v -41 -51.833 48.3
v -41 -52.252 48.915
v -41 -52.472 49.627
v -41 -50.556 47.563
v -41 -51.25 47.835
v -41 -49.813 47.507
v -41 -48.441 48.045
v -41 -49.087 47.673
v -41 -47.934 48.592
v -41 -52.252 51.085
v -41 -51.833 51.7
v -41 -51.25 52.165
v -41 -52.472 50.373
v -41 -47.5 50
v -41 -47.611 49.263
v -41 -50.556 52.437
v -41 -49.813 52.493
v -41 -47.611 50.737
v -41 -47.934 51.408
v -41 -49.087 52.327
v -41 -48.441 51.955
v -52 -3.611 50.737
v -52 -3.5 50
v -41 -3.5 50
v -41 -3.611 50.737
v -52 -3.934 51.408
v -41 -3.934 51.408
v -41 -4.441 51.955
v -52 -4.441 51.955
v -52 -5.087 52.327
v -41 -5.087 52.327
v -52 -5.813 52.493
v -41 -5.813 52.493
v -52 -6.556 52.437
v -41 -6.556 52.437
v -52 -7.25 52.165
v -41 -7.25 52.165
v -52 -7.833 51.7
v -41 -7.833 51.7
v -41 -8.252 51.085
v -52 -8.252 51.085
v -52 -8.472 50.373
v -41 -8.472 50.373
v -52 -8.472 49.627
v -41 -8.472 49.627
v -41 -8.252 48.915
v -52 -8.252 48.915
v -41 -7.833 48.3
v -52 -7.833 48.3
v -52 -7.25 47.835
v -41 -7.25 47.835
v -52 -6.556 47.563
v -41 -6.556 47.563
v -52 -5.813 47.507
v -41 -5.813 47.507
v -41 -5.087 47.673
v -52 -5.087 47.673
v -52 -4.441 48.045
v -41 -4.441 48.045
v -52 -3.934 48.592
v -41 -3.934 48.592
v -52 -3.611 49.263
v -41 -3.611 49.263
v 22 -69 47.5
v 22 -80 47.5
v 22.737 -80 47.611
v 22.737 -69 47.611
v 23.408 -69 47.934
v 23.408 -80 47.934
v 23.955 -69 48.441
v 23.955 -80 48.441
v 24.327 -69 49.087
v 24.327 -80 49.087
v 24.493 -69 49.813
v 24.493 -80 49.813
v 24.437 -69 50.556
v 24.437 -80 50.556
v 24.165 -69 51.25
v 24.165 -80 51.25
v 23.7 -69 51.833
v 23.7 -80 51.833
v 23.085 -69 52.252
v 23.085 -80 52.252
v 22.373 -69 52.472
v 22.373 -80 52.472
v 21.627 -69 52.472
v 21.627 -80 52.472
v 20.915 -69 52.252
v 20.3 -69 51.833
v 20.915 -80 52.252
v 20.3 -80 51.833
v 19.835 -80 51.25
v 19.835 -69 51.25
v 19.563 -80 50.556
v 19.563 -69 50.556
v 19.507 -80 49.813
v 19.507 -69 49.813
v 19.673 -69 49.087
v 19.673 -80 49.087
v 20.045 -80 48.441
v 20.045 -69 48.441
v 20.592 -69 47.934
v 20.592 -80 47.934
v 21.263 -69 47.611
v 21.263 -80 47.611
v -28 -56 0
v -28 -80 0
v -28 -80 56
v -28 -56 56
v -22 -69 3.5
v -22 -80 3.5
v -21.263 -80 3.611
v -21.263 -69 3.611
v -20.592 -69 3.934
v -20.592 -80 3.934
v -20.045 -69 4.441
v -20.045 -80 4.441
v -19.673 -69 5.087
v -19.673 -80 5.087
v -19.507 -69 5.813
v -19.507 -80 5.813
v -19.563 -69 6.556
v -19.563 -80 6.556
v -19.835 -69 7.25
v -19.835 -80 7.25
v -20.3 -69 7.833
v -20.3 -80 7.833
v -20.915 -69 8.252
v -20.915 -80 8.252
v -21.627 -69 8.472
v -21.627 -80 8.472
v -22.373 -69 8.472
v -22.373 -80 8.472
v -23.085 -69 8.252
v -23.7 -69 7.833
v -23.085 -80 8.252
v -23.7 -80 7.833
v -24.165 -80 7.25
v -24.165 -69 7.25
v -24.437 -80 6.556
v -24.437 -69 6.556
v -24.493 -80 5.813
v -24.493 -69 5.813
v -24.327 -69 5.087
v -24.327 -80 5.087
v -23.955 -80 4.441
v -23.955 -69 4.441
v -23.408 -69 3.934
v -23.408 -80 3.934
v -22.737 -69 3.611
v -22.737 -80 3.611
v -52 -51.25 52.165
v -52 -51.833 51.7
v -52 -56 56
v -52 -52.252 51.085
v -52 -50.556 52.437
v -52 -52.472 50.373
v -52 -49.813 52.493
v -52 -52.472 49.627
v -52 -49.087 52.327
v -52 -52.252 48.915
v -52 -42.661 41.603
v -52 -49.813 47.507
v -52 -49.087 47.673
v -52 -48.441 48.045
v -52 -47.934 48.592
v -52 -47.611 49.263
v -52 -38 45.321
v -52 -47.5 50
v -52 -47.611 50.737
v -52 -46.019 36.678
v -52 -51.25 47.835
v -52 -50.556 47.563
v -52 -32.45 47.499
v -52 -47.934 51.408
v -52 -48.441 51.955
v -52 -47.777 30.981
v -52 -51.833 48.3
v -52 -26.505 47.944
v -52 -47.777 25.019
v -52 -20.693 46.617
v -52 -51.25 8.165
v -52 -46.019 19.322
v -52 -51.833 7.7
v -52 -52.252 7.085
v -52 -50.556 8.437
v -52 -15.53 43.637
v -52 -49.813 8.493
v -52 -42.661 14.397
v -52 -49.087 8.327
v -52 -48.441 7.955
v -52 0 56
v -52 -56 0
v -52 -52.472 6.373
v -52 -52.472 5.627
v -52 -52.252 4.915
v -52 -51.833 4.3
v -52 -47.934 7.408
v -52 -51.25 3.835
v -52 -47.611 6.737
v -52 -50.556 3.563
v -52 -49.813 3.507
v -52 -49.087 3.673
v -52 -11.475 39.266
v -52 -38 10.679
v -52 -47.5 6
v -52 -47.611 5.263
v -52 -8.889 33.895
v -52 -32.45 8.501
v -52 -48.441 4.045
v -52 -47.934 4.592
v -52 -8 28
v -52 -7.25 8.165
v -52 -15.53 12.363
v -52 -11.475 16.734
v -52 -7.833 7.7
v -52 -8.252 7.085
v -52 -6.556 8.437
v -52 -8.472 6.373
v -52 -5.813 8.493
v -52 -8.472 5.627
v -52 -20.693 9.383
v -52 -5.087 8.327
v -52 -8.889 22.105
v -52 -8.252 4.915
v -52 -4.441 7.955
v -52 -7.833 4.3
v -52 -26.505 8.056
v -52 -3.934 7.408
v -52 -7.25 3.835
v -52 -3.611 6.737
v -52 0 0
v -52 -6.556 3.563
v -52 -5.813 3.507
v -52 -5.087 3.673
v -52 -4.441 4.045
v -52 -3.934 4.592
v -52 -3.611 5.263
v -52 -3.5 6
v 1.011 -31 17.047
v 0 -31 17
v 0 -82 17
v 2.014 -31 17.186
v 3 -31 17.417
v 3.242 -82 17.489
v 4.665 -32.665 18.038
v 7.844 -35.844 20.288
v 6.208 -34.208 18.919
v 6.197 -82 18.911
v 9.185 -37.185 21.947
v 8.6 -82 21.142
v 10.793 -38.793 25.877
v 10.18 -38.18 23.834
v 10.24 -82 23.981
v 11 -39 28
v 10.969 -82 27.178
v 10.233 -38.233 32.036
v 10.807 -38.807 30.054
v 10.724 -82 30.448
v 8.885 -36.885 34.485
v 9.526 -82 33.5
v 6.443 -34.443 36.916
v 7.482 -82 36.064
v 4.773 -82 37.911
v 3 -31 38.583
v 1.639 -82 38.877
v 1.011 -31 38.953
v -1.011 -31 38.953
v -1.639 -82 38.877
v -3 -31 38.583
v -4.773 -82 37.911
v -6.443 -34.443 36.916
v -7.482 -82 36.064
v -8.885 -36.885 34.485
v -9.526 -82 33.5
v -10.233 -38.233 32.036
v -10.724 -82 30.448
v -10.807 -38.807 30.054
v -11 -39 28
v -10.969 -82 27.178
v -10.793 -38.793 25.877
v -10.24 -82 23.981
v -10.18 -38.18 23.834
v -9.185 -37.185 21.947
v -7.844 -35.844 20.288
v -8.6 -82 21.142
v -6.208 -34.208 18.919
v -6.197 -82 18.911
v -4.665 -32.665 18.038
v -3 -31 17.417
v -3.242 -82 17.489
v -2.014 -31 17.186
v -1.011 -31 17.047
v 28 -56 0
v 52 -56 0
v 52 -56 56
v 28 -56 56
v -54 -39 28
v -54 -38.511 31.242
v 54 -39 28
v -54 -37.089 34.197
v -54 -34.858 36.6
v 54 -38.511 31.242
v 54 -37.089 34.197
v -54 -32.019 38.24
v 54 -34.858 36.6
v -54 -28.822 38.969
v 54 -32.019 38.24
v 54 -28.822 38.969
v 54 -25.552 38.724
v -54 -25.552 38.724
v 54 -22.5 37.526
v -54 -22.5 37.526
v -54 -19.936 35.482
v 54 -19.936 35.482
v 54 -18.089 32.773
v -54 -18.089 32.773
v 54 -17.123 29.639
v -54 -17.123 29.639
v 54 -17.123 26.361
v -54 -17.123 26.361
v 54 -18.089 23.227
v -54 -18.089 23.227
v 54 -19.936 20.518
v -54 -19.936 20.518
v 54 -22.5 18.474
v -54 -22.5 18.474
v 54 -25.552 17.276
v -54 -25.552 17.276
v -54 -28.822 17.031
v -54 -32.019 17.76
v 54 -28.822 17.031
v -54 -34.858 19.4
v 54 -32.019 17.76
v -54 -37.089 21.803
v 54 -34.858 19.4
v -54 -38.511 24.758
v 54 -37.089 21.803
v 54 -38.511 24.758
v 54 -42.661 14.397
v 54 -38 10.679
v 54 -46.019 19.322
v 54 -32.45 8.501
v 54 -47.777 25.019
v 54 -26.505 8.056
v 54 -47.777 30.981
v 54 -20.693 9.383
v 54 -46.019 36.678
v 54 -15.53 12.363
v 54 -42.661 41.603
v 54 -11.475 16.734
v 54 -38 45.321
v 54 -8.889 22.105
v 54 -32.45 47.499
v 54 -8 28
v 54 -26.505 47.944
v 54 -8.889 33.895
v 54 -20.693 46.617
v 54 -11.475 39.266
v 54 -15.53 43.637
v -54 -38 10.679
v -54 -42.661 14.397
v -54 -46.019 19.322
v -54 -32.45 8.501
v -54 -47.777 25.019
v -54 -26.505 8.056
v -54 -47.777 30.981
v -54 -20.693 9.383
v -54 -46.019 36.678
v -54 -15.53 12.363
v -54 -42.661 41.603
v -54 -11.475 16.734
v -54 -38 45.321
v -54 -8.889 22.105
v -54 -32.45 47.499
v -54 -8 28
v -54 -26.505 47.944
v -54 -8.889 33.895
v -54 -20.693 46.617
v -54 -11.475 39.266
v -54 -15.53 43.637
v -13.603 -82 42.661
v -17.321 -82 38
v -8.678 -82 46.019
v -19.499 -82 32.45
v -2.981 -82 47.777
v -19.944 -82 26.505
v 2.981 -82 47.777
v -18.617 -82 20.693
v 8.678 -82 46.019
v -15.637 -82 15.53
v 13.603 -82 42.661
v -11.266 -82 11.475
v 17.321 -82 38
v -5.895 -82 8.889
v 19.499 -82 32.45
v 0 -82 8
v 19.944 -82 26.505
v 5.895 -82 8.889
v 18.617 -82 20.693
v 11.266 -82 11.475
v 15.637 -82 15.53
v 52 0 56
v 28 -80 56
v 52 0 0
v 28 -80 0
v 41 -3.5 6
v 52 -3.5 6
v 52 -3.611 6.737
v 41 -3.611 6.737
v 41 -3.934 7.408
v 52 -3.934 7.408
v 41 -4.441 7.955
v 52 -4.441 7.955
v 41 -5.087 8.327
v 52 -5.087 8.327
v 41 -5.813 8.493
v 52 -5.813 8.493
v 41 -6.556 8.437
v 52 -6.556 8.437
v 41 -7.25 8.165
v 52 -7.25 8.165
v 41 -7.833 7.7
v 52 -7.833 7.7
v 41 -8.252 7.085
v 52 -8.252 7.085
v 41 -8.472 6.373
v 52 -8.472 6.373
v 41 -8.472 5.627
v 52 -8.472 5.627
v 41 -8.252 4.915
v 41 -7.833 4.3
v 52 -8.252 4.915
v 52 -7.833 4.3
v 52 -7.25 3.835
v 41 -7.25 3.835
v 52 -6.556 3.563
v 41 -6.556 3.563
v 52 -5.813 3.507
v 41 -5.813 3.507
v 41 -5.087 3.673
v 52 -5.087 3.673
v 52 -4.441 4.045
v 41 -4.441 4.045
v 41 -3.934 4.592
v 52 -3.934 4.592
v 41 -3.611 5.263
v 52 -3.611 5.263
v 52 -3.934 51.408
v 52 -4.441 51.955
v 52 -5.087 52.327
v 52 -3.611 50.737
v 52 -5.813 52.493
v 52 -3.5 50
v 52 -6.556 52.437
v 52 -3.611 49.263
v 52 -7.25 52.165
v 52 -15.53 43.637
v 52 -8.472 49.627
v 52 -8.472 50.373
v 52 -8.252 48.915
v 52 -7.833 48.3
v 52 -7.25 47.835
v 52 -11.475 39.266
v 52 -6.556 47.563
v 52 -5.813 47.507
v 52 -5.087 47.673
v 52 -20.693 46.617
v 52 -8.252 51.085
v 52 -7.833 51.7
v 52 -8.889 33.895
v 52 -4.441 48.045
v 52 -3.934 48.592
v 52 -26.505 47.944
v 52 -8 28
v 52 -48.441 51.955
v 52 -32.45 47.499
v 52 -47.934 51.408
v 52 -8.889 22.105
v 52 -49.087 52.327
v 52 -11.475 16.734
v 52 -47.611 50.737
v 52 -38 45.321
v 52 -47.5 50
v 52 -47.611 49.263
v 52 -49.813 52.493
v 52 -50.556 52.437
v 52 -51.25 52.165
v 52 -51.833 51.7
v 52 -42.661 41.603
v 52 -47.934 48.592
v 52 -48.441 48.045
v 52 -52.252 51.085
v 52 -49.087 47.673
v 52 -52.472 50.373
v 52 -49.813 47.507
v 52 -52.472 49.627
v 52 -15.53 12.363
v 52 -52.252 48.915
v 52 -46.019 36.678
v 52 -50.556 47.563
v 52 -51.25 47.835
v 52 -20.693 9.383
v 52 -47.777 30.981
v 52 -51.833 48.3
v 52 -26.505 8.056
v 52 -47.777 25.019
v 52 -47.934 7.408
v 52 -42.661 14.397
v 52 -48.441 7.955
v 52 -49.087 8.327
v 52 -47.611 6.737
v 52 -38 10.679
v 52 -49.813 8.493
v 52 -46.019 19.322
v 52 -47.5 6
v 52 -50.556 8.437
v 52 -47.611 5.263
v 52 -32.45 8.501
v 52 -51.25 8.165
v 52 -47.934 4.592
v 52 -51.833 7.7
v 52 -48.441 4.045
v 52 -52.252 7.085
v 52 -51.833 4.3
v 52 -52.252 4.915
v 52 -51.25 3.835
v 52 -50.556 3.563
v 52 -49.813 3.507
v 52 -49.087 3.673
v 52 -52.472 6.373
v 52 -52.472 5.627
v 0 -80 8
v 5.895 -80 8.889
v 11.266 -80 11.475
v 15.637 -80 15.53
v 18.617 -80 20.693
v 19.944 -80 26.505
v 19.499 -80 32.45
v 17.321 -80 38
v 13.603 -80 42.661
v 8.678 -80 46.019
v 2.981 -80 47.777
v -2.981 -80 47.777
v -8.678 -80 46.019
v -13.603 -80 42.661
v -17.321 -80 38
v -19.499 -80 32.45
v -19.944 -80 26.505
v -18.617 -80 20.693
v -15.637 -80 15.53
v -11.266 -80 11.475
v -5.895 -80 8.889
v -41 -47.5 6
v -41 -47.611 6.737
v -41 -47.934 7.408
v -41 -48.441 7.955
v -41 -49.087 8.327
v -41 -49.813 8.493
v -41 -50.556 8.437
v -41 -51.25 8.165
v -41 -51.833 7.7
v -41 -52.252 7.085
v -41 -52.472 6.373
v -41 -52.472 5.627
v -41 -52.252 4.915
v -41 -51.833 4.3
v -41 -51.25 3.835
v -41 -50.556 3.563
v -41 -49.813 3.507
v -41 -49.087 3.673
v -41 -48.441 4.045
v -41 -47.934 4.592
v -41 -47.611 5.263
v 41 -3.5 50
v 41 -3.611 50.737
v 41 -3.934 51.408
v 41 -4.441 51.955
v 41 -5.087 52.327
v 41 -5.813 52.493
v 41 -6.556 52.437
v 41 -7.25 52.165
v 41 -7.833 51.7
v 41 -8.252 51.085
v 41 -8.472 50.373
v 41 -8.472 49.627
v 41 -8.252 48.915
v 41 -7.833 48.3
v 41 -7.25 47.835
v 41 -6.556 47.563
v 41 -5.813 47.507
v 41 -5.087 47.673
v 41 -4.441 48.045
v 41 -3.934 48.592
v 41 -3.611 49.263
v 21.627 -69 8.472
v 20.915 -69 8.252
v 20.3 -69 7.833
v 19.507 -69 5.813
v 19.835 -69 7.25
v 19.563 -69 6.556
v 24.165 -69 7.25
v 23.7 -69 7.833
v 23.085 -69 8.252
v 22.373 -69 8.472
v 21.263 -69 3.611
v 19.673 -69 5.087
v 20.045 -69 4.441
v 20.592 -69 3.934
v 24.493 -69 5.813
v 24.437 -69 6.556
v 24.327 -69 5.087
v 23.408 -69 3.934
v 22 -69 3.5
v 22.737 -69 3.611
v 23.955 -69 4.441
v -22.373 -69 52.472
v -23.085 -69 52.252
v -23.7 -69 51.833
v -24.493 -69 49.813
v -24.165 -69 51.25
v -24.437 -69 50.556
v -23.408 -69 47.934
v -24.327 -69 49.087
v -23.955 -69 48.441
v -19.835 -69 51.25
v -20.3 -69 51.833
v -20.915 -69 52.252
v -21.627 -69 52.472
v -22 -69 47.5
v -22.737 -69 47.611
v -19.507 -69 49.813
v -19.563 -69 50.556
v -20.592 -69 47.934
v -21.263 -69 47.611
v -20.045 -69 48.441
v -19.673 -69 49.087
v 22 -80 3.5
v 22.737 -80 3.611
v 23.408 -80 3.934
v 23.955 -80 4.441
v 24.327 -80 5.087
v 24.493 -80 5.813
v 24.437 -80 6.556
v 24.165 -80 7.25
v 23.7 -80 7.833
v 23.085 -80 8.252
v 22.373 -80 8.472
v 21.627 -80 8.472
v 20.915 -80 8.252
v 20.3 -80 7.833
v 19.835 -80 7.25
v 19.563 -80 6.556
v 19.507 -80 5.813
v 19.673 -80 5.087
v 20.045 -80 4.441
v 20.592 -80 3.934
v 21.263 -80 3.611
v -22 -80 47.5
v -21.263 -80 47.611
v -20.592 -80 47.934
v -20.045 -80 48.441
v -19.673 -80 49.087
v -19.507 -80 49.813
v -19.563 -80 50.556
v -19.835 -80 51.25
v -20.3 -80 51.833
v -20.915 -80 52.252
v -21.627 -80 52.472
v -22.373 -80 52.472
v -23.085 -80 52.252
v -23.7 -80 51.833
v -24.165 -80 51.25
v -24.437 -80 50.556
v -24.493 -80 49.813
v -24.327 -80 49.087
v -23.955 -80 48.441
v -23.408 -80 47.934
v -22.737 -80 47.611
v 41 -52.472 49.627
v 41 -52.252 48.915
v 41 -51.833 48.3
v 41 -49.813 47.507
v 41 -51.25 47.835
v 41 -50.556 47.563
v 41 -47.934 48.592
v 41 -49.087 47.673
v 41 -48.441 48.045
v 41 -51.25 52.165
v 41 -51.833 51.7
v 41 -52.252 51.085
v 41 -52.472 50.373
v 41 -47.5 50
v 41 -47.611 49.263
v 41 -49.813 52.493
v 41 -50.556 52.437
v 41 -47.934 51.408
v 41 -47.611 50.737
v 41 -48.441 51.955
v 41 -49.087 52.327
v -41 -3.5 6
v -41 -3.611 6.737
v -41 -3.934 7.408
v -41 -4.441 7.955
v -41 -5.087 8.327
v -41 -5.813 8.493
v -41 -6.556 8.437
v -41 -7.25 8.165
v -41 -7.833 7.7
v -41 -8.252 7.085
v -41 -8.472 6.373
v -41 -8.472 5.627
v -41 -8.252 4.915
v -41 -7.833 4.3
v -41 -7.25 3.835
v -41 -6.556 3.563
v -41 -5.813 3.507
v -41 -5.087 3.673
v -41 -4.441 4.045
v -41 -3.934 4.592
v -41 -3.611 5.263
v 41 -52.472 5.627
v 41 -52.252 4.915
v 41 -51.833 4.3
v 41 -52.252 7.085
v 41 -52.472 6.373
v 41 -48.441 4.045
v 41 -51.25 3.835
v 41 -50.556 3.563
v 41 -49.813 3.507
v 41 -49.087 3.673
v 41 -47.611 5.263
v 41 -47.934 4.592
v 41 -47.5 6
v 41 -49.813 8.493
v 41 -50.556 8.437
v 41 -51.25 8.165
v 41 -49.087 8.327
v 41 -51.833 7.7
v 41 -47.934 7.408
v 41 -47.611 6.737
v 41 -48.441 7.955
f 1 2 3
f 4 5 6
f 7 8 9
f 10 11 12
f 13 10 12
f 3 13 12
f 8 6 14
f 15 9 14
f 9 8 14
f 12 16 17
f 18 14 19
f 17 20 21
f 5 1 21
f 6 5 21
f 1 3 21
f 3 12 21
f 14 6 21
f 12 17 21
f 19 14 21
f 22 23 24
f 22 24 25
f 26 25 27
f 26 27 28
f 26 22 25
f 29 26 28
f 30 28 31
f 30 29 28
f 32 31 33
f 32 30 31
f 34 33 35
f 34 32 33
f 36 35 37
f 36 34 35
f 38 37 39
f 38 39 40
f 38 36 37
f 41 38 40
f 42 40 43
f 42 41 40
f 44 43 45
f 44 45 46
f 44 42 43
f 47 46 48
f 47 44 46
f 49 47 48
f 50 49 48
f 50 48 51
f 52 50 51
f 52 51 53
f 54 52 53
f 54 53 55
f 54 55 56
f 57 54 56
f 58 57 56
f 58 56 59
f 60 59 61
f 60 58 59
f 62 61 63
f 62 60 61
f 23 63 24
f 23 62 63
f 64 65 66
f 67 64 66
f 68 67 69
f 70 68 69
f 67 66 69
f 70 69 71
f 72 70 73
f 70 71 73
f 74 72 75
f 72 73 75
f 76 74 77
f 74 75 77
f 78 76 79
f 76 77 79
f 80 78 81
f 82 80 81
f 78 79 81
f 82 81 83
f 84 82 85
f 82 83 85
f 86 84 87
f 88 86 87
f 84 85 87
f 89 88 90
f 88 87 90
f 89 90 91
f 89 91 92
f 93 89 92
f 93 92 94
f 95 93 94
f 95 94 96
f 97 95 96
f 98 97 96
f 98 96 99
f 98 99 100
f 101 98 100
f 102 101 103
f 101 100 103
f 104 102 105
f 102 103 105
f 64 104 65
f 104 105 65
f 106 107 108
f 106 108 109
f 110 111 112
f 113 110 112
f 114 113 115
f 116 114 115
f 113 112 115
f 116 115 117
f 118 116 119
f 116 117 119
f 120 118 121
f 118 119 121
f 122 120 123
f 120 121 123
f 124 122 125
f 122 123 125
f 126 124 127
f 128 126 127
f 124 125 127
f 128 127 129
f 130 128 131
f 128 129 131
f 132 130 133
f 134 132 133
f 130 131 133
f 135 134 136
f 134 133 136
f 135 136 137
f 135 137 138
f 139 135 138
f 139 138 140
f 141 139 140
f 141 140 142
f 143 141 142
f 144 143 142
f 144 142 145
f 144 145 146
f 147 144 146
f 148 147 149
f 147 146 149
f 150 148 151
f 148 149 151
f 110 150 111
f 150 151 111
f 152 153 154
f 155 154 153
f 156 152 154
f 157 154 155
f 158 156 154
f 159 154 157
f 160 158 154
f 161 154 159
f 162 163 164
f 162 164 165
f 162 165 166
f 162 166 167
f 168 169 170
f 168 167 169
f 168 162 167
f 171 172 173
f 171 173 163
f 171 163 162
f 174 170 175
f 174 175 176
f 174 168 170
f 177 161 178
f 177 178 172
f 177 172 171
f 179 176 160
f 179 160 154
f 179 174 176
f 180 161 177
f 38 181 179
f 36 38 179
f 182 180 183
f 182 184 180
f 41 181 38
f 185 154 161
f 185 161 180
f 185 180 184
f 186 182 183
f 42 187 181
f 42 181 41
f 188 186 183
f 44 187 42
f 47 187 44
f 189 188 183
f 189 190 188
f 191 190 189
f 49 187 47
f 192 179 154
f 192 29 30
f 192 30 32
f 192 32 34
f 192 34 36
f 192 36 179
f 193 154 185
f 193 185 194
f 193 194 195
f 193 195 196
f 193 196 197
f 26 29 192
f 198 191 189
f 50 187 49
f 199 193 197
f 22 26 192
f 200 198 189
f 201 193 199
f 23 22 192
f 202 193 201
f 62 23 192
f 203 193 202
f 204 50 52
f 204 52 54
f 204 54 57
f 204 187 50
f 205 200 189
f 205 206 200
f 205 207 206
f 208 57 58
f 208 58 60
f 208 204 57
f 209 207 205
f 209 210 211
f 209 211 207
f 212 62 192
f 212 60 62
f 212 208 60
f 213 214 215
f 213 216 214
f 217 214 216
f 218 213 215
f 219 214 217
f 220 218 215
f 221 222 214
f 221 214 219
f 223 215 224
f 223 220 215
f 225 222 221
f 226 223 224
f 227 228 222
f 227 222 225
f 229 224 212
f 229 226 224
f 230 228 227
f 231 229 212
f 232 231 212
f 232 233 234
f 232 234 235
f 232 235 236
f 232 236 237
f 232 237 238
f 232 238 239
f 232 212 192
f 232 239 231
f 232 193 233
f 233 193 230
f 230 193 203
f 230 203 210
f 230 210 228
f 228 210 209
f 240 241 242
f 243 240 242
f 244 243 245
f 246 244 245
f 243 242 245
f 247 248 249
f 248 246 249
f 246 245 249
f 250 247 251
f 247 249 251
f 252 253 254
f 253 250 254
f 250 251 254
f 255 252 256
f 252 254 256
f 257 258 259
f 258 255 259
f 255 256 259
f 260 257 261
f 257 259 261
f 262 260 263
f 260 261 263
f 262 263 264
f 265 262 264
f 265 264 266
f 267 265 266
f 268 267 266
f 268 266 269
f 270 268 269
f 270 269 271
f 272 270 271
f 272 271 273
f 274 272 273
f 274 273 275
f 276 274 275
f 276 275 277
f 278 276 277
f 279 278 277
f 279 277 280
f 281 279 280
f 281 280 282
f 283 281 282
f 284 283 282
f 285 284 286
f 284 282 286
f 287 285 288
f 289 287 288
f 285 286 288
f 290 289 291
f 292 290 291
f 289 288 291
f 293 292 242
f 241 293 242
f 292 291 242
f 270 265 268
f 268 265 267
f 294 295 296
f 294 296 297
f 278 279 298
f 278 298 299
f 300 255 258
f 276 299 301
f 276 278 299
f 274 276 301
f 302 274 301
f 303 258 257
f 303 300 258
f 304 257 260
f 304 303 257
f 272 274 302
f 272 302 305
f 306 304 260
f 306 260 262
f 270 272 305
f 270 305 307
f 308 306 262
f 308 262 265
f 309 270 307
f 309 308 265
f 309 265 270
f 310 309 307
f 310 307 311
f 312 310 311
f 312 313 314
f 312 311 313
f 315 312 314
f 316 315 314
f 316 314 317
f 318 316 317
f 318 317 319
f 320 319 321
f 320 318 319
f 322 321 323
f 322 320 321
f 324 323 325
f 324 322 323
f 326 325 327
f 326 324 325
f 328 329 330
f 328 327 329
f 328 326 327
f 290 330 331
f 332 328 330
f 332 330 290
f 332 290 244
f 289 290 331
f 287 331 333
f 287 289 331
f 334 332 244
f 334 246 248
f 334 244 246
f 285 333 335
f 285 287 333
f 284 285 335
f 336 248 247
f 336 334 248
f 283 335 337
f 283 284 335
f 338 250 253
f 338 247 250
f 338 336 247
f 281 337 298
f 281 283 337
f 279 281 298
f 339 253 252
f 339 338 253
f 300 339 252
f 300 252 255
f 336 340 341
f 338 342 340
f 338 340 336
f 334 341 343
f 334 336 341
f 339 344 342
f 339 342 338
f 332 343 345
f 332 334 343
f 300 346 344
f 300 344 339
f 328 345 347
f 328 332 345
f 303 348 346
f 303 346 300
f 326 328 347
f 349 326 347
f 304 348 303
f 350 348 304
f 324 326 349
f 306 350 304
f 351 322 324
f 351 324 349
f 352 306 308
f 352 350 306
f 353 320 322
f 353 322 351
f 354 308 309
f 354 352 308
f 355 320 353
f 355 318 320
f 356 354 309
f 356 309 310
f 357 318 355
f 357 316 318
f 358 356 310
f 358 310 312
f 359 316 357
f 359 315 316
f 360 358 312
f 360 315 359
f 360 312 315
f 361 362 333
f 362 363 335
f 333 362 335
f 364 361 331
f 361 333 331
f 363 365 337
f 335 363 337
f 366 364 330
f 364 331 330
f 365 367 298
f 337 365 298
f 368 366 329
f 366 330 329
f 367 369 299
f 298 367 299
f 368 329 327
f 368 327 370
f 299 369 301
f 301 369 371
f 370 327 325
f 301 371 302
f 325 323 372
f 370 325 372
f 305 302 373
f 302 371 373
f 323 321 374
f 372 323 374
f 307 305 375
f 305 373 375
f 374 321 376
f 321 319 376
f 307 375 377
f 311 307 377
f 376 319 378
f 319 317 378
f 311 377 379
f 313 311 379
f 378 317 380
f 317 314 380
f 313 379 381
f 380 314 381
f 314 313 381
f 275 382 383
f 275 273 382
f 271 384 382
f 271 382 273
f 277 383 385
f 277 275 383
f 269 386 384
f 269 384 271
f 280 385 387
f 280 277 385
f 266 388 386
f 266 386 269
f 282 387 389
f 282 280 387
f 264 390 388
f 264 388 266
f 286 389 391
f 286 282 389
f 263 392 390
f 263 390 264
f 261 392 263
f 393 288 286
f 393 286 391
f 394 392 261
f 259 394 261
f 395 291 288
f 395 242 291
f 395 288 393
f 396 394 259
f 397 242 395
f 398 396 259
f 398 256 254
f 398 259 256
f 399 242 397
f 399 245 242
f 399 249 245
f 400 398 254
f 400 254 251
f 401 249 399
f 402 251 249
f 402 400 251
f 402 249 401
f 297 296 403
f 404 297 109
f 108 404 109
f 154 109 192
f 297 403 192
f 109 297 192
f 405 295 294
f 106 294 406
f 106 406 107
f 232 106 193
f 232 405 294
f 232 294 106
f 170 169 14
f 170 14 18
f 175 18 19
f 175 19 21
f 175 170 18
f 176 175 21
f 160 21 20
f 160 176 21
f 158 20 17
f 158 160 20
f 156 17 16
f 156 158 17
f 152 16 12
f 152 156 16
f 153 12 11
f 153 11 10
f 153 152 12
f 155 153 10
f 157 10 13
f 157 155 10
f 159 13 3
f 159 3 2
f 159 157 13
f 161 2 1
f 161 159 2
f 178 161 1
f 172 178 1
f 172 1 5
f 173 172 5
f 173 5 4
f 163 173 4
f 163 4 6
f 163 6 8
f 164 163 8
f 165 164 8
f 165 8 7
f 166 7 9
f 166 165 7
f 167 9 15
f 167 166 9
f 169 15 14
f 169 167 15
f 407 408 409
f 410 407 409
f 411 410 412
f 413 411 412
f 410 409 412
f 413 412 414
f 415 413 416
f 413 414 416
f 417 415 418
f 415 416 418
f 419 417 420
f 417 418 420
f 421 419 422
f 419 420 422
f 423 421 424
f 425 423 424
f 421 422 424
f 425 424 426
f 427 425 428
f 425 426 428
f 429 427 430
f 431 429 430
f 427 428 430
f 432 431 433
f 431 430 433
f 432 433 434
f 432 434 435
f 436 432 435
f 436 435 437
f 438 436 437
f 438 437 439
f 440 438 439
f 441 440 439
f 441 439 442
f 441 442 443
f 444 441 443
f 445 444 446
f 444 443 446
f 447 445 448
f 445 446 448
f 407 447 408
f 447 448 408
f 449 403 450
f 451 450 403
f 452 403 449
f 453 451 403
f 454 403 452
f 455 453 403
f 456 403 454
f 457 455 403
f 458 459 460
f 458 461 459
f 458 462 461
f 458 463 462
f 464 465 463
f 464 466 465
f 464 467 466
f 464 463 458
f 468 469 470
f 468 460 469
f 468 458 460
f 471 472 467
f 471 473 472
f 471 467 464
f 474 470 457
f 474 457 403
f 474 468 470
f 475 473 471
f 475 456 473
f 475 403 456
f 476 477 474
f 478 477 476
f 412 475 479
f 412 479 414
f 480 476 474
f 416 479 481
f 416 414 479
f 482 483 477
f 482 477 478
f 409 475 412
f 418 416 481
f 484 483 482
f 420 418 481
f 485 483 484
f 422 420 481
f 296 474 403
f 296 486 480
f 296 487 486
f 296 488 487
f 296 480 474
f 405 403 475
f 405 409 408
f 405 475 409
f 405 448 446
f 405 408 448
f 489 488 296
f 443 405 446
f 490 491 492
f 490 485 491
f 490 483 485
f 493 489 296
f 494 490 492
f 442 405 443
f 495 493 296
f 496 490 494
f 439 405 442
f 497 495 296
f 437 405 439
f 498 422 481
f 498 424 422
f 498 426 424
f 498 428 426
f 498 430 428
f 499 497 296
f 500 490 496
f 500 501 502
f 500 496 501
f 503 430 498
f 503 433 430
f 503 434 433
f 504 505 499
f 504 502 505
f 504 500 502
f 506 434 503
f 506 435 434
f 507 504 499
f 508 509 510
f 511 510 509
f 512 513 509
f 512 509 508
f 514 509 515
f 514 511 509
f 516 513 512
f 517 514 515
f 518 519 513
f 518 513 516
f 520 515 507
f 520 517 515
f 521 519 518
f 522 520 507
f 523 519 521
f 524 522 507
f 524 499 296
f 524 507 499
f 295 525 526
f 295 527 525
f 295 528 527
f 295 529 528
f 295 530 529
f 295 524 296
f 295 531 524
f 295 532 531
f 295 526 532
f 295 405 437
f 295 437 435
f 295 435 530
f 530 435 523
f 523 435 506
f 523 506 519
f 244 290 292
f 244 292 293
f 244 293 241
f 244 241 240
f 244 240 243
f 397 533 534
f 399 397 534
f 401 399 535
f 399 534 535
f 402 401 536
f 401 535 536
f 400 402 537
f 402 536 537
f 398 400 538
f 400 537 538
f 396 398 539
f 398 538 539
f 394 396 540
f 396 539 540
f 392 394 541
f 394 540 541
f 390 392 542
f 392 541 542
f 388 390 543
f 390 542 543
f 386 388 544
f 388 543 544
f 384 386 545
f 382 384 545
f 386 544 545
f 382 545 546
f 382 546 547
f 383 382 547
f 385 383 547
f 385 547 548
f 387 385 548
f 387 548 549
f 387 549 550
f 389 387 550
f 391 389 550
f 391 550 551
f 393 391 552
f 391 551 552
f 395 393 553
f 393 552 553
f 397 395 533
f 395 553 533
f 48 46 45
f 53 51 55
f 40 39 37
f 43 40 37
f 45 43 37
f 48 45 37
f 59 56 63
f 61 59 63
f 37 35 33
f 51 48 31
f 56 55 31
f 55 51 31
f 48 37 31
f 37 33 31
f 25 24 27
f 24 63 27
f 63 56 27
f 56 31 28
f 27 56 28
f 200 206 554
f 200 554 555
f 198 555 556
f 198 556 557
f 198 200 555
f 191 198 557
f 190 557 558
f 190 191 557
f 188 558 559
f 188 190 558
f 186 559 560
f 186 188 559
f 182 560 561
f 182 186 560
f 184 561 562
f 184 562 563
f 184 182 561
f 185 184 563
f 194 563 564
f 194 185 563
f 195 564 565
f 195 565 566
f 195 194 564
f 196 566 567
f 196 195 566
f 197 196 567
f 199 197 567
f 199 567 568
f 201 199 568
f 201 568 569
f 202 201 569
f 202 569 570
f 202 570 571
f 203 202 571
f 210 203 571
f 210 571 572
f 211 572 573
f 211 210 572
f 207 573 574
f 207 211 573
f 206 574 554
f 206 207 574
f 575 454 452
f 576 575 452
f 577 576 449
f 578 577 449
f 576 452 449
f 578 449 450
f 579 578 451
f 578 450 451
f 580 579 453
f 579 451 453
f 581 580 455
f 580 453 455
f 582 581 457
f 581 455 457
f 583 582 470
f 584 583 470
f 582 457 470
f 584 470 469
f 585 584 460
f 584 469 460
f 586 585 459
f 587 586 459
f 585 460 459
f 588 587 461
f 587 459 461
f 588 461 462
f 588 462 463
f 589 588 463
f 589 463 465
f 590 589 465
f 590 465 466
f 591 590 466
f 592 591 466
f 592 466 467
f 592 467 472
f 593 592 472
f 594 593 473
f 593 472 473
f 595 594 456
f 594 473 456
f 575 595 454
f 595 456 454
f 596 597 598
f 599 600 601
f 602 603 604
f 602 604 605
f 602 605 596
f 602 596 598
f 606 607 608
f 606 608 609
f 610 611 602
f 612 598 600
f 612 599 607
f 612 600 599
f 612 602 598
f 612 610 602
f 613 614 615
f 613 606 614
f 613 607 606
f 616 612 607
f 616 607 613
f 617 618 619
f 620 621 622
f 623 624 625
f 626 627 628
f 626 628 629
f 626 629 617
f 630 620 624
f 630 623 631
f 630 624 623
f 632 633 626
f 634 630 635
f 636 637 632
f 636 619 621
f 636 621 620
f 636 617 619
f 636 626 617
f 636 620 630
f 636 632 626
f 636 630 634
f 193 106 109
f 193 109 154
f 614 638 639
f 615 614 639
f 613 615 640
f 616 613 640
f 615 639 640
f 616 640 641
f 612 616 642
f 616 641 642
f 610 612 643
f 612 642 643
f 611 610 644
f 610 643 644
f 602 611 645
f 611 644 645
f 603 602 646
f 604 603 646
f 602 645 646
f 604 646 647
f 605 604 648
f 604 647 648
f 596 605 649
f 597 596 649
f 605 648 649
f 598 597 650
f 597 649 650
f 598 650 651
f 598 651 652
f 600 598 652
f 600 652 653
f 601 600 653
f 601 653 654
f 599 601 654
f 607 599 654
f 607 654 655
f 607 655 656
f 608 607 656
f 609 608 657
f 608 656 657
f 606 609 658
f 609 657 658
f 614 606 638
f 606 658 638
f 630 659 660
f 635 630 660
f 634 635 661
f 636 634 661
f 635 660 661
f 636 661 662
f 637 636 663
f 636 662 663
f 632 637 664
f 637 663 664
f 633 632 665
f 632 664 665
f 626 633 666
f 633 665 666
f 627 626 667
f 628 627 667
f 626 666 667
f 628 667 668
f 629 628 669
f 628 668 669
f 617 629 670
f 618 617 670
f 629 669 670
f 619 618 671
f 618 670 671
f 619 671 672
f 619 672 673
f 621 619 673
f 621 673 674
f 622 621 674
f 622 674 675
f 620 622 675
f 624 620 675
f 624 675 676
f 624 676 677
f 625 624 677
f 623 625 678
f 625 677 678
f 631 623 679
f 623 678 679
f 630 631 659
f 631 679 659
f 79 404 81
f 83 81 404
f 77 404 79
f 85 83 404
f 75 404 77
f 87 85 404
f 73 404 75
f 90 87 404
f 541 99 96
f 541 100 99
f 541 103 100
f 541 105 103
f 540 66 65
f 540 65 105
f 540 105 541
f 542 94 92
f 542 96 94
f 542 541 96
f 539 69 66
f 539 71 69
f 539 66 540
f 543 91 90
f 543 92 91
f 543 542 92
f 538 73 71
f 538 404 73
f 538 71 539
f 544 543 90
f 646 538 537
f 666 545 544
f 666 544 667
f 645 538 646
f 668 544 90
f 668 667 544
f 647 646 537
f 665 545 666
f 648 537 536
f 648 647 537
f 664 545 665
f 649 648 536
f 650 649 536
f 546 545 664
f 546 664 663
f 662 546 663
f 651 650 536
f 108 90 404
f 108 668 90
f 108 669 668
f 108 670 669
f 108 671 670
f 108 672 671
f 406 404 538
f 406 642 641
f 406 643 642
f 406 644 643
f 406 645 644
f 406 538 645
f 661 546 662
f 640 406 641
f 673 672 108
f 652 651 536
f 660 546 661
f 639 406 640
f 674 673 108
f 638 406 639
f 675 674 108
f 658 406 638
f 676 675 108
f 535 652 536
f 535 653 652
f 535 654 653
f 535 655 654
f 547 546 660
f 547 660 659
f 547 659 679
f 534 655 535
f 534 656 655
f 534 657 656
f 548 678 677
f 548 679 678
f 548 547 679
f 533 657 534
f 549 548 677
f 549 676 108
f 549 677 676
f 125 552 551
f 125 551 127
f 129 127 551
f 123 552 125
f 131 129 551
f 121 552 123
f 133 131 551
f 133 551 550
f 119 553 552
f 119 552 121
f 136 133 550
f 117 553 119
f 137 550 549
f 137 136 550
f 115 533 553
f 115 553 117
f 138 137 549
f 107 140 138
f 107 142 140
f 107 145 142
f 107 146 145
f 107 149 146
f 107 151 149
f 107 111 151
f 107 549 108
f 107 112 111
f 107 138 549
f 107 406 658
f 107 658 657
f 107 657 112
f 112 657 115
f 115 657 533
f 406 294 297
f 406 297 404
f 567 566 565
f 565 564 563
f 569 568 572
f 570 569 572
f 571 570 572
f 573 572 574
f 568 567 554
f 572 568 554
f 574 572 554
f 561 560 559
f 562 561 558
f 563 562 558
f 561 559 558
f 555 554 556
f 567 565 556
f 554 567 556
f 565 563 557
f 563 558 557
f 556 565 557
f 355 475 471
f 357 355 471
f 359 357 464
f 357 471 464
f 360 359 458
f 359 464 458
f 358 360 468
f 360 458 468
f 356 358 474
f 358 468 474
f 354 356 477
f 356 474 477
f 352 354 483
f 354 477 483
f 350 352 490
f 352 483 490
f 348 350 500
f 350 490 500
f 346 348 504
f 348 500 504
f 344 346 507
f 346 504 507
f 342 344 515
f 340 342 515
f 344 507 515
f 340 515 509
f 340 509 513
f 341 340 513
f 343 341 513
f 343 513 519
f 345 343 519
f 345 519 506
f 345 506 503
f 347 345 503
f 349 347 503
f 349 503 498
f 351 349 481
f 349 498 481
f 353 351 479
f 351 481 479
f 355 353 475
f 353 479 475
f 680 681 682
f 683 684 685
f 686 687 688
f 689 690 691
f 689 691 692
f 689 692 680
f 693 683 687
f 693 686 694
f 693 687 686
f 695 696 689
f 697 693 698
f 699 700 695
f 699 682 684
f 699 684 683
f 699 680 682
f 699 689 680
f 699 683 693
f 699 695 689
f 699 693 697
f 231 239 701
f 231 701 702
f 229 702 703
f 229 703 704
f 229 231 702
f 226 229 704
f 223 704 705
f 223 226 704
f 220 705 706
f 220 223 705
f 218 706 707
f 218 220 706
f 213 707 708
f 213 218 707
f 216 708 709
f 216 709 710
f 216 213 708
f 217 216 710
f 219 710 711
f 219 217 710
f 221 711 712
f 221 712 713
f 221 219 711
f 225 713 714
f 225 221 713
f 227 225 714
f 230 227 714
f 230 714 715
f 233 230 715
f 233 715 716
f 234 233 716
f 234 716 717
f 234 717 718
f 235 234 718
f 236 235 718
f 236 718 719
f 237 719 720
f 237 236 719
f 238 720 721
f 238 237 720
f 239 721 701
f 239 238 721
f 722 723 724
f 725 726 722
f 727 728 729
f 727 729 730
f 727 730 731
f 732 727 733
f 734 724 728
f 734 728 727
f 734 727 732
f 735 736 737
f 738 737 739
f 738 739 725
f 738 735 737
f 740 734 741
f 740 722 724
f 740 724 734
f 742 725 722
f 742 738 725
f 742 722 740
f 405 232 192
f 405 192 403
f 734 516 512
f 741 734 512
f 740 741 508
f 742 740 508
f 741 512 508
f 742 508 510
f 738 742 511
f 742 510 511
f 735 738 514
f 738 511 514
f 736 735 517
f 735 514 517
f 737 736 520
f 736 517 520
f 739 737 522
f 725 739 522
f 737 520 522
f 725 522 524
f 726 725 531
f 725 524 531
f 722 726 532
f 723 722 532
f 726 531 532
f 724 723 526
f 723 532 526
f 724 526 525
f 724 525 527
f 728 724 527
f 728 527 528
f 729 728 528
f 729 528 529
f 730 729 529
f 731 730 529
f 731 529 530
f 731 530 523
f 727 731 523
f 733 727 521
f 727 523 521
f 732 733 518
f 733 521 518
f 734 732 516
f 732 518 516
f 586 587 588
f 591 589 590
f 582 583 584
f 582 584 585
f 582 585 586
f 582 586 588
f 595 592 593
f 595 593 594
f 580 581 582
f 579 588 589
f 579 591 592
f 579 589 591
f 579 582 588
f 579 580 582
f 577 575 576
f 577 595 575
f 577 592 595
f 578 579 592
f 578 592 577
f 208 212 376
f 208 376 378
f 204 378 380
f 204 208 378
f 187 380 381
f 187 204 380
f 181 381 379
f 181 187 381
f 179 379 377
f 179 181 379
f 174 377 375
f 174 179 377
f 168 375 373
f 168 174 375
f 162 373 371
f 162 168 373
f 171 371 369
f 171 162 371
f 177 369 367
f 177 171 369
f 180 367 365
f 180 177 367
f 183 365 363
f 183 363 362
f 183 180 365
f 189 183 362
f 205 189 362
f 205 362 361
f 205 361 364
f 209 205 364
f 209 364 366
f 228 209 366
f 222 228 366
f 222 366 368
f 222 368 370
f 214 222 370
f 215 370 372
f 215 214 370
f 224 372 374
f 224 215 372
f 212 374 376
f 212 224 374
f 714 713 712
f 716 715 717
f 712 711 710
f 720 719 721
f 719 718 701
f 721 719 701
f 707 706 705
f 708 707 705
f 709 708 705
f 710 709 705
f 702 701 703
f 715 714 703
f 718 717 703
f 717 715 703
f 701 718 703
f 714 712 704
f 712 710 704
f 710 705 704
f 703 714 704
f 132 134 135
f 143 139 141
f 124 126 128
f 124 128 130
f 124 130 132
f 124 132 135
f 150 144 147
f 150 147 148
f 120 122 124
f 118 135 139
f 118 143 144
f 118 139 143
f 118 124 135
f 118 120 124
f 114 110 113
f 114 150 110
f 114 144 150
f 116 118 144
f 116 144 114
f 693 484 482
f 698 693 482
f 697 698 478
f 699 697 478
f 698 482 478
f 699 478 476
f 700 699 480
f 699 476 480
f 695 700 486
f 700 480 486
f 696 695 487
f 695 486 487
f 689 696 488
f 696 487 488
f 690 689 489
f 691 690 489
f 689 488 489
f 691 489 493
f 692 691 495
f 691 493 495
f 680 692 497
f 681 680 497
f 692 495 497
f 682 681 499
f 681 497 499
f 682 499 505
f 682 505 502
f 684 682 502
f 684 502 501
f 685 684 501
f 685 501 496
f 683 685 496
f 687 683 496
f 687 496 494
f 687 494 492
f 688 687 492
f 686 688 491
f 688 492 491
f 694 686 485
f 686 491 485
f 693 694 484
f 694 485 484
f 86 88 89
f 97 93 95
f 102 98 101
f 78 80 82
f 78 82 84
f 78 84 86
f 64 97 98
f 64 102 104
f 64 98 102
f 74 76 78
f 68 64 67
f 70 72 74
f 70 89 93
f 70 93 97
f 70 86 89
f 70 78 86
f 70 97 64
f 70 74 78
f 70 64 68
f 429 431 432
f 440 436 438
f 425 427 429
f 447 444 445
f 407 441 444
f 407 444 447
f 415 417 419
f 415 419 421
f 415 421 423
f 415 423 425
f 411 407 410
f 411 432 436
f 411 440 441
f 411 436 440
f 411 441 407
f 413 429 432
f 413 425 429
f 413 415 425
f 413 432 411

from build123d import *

# Parameters (mm, degrees)
BOSS_EXTRUDE1_DEPTH     = 56
SKETCH2_R               = 20
BOSS_EXTRUDE2_DEPTH     = 2
SKETCH4_R               = 20
BOSS_EXTRUDE3_DEPTH     = 2
SKETCH5_R               = 2.5
CUT_EXTRUDE1_DEPTH      = 11
SKETCH6_R               = 2.5
CUT_EXTRUDE2_DEPTH      = 11
CUT_EXTRUDE3_DEPTH      = 147.710599481
CUT_EXTRUDE3_DEPTH_BACK = 147.710599481
SKETCH7_R               = 11
SKETCH8_R               = 11
CUT_EXTRUDE4_DEPTH      = 51


with BuildPart() as part:
    # Sketch1 → Boss-Extrude1 (new body)
    with BuildSketch(Plane.XY):
        Polygon((-52, 0), (52, 0), (52, -56), (28, -56), (28, -80), (-28, -80), (-28, -56), (-52, -56), align=None)
    extrude(amount=BOSS_EXTRUDE1_DEPTH)

    # Sketch2 → Boss-Extrude2 (add)
    with BuildSketch(Plane(origin=(52, 0, 0), x_dir=(0, 0, -1), z_dir=(1, 0, 0))):
        with Locations(Location((-28, -28, 0), (0, 0, 90))):
            Circle(SKETCH2_R)
    boss_extrude2 = extrude(amount=BOSS_EXTRUDE2_DEPTH)

    # Mirror1: Boss-Extrude2 across plane
    add(boss_extrude2.mirror(Plane(origin=(0, 0, 0), x_dir=(0, 0, 1), z_dir=(1, 0, 0))))

    # Sketch4 → Boss-Extrude3 (add)
    with BuildSketch(Plane.XZ.offset(80)):
        with Locations(Location((0, 28, 0), (0, 0, 270))):
            Circle(SKETCH4_R)
    extrude(amount=BOSS_EXTRUDE3_DEPTH)

    # Sketch5 → Cut-Extrude1 (cut)
    with BuildSketch(Plane(origin=(52, 0, 0), x_dir=(0, 0, -1), z_dir=(1, 0, 0))):
        with Locations(Location((-50, -6, 0), (0, 0, 90))):
            Circle(SKETCH5_R)
        with Locations(Location((-50, -50, 0), (0, 0, 90))):
            Circle(SKETCH5_R)
        with Locations(Location((-6, -50, 0), (0, 0, 90))):
            Circle(SKETCH5_R)
        with Locations(Location((-6, -6, 0), (0, 0, 90))):
            Circle(SKETCH5_R)
    cut_extrude1 = extrude(amount=-CUT_EXTRUDE1_DEPTH, mode=Mode.SUBTRACT)

    # Mirror2: Cut-Extrude1 across plane
    add(cut_extrude1.mirror(Plane(origin=(0, 0, 0), x_dir=(0, 0, 1), z_dir=(1, 0, 0))), mode=Mode.SUBTRACT)

    # Sketch6 → Cut-Extrude2 (cut)
    with BuildSketch(Plane.XZ.offset(80)):
        with Locations(Location((-22, 50, 0), (0, 0, 270))):
            Circle(SKETCH6_R)
        with Locations(Location((22, 50, 0), (0, 0, 270))):
            Circle(SKETCH6_R)
        with Locations(Location((22, 6, 0), (0, 0, 270))):
            Circle(SKETCH6_R)
        with Locations(Location((-22, 6, 0), (0, 0, 270))):
            Circle(SKETCH6_R)
    extrude(amount=-CUT_EXTRUDE2_DEPTH, mode=Mode.SUBTRACT)

    # Sketch7 → Cut-Extrude3 (cut, two sides: drawn at the far end of the back side and taken through both)
    with BuildSketch(Plane.ZY.offset(54).offset(-CUT_EXTRUDE3_DEPTH_BACK)):
        with Locations(Location((28, -28, 0), (0, 0, 270))):
            Circle(SKETCH7_R)
    extrude(amount=CUT_EXTRUDE3_DEPTH + CUT_EXTRUDE3_DEPTH_BACK, mode=Mode.SUBTRACT)

    # Sketch8 → Cut-Extrude4 (cut)
    with BuildSketch(Plane.XZ.offset(82)):
        with Locations(Location((0, 28, 0), (0, 0, 270))):
            Circle(SKETCH8_R)
    extrude(amount=-CUT_EXTRUDE4_DEPTH, mode=Mode.SUBTRACT)


solid = part.part
